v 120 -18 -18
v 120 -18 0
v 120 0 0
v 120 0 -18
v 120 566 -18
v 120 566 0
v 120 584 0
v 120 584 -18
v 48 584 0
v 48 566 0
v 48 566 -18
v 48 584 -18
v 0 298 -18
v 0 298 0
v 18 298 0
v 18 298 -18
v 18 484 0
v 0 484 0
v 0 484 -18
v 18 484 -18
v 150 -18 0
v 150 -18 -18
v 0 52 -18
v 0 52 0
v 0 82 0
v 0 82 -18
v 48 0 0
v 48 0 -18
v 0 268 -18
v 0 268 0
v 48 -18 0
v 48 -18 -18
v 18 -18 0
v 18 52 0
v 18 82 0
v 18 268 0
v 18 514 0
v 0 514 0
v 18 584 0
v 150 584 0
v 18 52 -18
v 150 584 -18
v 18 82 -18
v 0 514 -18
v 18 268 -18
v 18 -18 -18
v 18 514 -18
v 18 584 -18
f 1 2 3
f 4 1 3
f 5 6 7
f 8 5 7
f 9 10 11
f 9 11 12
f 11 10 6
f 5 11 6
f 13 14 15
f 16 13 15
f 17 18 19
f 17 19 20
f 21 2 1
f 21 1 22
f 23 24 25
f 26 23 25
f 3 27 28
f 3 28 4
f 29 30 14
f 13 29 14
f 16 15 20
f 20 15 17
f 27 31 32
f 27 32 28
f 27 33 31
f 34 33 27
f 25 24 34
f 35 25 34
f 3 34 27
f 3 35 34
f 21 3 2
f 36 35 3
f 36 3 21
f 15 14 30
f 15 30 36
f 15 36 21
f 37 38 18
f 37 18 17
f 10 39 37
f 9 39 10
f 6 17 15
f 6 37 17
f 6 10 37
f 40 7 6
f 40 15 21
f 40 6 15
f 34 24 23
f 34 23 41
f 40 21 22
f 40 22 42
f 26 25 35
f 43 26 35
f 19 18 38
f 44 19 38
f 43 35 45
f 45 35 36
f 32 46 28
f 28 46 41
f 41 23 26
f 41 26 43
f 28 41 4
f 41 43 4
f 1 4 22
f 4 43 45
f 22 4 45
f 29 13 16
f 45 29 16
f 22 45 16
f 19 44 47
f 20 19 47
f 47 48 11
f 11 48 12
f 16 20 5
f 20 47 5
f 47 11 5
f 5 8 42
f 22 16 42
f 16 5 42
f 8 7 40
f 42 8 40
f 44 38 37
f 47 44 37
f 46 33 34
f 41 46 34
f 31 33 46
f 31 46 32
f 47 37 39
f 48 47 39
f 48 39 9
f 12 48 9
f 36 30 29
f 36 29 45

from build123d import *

# Parameters (mm, degrees)
ESQUISSE1_W             = 150
ESQUISSE1_H             = 602
BOSS_EXTRU_1_DEPTH      = 18
ESQUISSE2_W             = 18
ESQUISSE2_H             = 70
ESQUISSE2_H_2           = 186
ENL_V_MAT_EXTRU_1_DEPTH = 604.224667931
ESQUISSE3_W             = 72
ESQUISSE3_H             = 18
ENL_V_MAT_EXTRU_2_DEPTH = 604.224667931


with BuildPart() as part:
    # Esquisse1 → Boss.-Extru.1 (new body)
    with BuildSketch(Plane.XY):
        with Locations((75, 283)):
            Rectangle(ESQUISSE1_W, ESQUISSE1_H)
    extrude(amount=-BOSS_EXTRU_1_DEPTH)

    # Esquisse2 → Enlèv. mat.-Extru.1 (cut, through all)
    with BuildSketch(Plane.XY):
        with Locations((9, 549)):
            Rectangle(ESQUISSE2_W, ESQUISSE2_H)
        with Locations((9, 391)):
            Rectangle(ESQUISSE2_W, ESQUISSE2_H_2)
        with Locations((9, 175)):
            Rectangle(ESQUISSE2_W, ESQUISSE2_H_2)
        with Locations((9, 17)):
            Rectangle(ESQUISSE2_W, ESQUISSE2_H)
    extrude(amount=-ENL_V_MAT_EXTRU_1_DEPTH, mode=Mode.SUBTRACT)

    # Esquisse3 → Enlèv. mat.-Extru.2 (cut, through all)
    with BuildSketch(Plane.XY):
        with Locations((84, 575)):
            Rectangle(ESQUISSE3_W, ESQUISSE3_H)
        with Locations((84, -9)):
            Rectangle(ESQUISSE3_W, ESQUISSE3_H)
    extrude(amount=-ENL_V_MAT_EXTRU_2_DEPTH, mode=Mode.SUBTRACT)


solid = part.part
